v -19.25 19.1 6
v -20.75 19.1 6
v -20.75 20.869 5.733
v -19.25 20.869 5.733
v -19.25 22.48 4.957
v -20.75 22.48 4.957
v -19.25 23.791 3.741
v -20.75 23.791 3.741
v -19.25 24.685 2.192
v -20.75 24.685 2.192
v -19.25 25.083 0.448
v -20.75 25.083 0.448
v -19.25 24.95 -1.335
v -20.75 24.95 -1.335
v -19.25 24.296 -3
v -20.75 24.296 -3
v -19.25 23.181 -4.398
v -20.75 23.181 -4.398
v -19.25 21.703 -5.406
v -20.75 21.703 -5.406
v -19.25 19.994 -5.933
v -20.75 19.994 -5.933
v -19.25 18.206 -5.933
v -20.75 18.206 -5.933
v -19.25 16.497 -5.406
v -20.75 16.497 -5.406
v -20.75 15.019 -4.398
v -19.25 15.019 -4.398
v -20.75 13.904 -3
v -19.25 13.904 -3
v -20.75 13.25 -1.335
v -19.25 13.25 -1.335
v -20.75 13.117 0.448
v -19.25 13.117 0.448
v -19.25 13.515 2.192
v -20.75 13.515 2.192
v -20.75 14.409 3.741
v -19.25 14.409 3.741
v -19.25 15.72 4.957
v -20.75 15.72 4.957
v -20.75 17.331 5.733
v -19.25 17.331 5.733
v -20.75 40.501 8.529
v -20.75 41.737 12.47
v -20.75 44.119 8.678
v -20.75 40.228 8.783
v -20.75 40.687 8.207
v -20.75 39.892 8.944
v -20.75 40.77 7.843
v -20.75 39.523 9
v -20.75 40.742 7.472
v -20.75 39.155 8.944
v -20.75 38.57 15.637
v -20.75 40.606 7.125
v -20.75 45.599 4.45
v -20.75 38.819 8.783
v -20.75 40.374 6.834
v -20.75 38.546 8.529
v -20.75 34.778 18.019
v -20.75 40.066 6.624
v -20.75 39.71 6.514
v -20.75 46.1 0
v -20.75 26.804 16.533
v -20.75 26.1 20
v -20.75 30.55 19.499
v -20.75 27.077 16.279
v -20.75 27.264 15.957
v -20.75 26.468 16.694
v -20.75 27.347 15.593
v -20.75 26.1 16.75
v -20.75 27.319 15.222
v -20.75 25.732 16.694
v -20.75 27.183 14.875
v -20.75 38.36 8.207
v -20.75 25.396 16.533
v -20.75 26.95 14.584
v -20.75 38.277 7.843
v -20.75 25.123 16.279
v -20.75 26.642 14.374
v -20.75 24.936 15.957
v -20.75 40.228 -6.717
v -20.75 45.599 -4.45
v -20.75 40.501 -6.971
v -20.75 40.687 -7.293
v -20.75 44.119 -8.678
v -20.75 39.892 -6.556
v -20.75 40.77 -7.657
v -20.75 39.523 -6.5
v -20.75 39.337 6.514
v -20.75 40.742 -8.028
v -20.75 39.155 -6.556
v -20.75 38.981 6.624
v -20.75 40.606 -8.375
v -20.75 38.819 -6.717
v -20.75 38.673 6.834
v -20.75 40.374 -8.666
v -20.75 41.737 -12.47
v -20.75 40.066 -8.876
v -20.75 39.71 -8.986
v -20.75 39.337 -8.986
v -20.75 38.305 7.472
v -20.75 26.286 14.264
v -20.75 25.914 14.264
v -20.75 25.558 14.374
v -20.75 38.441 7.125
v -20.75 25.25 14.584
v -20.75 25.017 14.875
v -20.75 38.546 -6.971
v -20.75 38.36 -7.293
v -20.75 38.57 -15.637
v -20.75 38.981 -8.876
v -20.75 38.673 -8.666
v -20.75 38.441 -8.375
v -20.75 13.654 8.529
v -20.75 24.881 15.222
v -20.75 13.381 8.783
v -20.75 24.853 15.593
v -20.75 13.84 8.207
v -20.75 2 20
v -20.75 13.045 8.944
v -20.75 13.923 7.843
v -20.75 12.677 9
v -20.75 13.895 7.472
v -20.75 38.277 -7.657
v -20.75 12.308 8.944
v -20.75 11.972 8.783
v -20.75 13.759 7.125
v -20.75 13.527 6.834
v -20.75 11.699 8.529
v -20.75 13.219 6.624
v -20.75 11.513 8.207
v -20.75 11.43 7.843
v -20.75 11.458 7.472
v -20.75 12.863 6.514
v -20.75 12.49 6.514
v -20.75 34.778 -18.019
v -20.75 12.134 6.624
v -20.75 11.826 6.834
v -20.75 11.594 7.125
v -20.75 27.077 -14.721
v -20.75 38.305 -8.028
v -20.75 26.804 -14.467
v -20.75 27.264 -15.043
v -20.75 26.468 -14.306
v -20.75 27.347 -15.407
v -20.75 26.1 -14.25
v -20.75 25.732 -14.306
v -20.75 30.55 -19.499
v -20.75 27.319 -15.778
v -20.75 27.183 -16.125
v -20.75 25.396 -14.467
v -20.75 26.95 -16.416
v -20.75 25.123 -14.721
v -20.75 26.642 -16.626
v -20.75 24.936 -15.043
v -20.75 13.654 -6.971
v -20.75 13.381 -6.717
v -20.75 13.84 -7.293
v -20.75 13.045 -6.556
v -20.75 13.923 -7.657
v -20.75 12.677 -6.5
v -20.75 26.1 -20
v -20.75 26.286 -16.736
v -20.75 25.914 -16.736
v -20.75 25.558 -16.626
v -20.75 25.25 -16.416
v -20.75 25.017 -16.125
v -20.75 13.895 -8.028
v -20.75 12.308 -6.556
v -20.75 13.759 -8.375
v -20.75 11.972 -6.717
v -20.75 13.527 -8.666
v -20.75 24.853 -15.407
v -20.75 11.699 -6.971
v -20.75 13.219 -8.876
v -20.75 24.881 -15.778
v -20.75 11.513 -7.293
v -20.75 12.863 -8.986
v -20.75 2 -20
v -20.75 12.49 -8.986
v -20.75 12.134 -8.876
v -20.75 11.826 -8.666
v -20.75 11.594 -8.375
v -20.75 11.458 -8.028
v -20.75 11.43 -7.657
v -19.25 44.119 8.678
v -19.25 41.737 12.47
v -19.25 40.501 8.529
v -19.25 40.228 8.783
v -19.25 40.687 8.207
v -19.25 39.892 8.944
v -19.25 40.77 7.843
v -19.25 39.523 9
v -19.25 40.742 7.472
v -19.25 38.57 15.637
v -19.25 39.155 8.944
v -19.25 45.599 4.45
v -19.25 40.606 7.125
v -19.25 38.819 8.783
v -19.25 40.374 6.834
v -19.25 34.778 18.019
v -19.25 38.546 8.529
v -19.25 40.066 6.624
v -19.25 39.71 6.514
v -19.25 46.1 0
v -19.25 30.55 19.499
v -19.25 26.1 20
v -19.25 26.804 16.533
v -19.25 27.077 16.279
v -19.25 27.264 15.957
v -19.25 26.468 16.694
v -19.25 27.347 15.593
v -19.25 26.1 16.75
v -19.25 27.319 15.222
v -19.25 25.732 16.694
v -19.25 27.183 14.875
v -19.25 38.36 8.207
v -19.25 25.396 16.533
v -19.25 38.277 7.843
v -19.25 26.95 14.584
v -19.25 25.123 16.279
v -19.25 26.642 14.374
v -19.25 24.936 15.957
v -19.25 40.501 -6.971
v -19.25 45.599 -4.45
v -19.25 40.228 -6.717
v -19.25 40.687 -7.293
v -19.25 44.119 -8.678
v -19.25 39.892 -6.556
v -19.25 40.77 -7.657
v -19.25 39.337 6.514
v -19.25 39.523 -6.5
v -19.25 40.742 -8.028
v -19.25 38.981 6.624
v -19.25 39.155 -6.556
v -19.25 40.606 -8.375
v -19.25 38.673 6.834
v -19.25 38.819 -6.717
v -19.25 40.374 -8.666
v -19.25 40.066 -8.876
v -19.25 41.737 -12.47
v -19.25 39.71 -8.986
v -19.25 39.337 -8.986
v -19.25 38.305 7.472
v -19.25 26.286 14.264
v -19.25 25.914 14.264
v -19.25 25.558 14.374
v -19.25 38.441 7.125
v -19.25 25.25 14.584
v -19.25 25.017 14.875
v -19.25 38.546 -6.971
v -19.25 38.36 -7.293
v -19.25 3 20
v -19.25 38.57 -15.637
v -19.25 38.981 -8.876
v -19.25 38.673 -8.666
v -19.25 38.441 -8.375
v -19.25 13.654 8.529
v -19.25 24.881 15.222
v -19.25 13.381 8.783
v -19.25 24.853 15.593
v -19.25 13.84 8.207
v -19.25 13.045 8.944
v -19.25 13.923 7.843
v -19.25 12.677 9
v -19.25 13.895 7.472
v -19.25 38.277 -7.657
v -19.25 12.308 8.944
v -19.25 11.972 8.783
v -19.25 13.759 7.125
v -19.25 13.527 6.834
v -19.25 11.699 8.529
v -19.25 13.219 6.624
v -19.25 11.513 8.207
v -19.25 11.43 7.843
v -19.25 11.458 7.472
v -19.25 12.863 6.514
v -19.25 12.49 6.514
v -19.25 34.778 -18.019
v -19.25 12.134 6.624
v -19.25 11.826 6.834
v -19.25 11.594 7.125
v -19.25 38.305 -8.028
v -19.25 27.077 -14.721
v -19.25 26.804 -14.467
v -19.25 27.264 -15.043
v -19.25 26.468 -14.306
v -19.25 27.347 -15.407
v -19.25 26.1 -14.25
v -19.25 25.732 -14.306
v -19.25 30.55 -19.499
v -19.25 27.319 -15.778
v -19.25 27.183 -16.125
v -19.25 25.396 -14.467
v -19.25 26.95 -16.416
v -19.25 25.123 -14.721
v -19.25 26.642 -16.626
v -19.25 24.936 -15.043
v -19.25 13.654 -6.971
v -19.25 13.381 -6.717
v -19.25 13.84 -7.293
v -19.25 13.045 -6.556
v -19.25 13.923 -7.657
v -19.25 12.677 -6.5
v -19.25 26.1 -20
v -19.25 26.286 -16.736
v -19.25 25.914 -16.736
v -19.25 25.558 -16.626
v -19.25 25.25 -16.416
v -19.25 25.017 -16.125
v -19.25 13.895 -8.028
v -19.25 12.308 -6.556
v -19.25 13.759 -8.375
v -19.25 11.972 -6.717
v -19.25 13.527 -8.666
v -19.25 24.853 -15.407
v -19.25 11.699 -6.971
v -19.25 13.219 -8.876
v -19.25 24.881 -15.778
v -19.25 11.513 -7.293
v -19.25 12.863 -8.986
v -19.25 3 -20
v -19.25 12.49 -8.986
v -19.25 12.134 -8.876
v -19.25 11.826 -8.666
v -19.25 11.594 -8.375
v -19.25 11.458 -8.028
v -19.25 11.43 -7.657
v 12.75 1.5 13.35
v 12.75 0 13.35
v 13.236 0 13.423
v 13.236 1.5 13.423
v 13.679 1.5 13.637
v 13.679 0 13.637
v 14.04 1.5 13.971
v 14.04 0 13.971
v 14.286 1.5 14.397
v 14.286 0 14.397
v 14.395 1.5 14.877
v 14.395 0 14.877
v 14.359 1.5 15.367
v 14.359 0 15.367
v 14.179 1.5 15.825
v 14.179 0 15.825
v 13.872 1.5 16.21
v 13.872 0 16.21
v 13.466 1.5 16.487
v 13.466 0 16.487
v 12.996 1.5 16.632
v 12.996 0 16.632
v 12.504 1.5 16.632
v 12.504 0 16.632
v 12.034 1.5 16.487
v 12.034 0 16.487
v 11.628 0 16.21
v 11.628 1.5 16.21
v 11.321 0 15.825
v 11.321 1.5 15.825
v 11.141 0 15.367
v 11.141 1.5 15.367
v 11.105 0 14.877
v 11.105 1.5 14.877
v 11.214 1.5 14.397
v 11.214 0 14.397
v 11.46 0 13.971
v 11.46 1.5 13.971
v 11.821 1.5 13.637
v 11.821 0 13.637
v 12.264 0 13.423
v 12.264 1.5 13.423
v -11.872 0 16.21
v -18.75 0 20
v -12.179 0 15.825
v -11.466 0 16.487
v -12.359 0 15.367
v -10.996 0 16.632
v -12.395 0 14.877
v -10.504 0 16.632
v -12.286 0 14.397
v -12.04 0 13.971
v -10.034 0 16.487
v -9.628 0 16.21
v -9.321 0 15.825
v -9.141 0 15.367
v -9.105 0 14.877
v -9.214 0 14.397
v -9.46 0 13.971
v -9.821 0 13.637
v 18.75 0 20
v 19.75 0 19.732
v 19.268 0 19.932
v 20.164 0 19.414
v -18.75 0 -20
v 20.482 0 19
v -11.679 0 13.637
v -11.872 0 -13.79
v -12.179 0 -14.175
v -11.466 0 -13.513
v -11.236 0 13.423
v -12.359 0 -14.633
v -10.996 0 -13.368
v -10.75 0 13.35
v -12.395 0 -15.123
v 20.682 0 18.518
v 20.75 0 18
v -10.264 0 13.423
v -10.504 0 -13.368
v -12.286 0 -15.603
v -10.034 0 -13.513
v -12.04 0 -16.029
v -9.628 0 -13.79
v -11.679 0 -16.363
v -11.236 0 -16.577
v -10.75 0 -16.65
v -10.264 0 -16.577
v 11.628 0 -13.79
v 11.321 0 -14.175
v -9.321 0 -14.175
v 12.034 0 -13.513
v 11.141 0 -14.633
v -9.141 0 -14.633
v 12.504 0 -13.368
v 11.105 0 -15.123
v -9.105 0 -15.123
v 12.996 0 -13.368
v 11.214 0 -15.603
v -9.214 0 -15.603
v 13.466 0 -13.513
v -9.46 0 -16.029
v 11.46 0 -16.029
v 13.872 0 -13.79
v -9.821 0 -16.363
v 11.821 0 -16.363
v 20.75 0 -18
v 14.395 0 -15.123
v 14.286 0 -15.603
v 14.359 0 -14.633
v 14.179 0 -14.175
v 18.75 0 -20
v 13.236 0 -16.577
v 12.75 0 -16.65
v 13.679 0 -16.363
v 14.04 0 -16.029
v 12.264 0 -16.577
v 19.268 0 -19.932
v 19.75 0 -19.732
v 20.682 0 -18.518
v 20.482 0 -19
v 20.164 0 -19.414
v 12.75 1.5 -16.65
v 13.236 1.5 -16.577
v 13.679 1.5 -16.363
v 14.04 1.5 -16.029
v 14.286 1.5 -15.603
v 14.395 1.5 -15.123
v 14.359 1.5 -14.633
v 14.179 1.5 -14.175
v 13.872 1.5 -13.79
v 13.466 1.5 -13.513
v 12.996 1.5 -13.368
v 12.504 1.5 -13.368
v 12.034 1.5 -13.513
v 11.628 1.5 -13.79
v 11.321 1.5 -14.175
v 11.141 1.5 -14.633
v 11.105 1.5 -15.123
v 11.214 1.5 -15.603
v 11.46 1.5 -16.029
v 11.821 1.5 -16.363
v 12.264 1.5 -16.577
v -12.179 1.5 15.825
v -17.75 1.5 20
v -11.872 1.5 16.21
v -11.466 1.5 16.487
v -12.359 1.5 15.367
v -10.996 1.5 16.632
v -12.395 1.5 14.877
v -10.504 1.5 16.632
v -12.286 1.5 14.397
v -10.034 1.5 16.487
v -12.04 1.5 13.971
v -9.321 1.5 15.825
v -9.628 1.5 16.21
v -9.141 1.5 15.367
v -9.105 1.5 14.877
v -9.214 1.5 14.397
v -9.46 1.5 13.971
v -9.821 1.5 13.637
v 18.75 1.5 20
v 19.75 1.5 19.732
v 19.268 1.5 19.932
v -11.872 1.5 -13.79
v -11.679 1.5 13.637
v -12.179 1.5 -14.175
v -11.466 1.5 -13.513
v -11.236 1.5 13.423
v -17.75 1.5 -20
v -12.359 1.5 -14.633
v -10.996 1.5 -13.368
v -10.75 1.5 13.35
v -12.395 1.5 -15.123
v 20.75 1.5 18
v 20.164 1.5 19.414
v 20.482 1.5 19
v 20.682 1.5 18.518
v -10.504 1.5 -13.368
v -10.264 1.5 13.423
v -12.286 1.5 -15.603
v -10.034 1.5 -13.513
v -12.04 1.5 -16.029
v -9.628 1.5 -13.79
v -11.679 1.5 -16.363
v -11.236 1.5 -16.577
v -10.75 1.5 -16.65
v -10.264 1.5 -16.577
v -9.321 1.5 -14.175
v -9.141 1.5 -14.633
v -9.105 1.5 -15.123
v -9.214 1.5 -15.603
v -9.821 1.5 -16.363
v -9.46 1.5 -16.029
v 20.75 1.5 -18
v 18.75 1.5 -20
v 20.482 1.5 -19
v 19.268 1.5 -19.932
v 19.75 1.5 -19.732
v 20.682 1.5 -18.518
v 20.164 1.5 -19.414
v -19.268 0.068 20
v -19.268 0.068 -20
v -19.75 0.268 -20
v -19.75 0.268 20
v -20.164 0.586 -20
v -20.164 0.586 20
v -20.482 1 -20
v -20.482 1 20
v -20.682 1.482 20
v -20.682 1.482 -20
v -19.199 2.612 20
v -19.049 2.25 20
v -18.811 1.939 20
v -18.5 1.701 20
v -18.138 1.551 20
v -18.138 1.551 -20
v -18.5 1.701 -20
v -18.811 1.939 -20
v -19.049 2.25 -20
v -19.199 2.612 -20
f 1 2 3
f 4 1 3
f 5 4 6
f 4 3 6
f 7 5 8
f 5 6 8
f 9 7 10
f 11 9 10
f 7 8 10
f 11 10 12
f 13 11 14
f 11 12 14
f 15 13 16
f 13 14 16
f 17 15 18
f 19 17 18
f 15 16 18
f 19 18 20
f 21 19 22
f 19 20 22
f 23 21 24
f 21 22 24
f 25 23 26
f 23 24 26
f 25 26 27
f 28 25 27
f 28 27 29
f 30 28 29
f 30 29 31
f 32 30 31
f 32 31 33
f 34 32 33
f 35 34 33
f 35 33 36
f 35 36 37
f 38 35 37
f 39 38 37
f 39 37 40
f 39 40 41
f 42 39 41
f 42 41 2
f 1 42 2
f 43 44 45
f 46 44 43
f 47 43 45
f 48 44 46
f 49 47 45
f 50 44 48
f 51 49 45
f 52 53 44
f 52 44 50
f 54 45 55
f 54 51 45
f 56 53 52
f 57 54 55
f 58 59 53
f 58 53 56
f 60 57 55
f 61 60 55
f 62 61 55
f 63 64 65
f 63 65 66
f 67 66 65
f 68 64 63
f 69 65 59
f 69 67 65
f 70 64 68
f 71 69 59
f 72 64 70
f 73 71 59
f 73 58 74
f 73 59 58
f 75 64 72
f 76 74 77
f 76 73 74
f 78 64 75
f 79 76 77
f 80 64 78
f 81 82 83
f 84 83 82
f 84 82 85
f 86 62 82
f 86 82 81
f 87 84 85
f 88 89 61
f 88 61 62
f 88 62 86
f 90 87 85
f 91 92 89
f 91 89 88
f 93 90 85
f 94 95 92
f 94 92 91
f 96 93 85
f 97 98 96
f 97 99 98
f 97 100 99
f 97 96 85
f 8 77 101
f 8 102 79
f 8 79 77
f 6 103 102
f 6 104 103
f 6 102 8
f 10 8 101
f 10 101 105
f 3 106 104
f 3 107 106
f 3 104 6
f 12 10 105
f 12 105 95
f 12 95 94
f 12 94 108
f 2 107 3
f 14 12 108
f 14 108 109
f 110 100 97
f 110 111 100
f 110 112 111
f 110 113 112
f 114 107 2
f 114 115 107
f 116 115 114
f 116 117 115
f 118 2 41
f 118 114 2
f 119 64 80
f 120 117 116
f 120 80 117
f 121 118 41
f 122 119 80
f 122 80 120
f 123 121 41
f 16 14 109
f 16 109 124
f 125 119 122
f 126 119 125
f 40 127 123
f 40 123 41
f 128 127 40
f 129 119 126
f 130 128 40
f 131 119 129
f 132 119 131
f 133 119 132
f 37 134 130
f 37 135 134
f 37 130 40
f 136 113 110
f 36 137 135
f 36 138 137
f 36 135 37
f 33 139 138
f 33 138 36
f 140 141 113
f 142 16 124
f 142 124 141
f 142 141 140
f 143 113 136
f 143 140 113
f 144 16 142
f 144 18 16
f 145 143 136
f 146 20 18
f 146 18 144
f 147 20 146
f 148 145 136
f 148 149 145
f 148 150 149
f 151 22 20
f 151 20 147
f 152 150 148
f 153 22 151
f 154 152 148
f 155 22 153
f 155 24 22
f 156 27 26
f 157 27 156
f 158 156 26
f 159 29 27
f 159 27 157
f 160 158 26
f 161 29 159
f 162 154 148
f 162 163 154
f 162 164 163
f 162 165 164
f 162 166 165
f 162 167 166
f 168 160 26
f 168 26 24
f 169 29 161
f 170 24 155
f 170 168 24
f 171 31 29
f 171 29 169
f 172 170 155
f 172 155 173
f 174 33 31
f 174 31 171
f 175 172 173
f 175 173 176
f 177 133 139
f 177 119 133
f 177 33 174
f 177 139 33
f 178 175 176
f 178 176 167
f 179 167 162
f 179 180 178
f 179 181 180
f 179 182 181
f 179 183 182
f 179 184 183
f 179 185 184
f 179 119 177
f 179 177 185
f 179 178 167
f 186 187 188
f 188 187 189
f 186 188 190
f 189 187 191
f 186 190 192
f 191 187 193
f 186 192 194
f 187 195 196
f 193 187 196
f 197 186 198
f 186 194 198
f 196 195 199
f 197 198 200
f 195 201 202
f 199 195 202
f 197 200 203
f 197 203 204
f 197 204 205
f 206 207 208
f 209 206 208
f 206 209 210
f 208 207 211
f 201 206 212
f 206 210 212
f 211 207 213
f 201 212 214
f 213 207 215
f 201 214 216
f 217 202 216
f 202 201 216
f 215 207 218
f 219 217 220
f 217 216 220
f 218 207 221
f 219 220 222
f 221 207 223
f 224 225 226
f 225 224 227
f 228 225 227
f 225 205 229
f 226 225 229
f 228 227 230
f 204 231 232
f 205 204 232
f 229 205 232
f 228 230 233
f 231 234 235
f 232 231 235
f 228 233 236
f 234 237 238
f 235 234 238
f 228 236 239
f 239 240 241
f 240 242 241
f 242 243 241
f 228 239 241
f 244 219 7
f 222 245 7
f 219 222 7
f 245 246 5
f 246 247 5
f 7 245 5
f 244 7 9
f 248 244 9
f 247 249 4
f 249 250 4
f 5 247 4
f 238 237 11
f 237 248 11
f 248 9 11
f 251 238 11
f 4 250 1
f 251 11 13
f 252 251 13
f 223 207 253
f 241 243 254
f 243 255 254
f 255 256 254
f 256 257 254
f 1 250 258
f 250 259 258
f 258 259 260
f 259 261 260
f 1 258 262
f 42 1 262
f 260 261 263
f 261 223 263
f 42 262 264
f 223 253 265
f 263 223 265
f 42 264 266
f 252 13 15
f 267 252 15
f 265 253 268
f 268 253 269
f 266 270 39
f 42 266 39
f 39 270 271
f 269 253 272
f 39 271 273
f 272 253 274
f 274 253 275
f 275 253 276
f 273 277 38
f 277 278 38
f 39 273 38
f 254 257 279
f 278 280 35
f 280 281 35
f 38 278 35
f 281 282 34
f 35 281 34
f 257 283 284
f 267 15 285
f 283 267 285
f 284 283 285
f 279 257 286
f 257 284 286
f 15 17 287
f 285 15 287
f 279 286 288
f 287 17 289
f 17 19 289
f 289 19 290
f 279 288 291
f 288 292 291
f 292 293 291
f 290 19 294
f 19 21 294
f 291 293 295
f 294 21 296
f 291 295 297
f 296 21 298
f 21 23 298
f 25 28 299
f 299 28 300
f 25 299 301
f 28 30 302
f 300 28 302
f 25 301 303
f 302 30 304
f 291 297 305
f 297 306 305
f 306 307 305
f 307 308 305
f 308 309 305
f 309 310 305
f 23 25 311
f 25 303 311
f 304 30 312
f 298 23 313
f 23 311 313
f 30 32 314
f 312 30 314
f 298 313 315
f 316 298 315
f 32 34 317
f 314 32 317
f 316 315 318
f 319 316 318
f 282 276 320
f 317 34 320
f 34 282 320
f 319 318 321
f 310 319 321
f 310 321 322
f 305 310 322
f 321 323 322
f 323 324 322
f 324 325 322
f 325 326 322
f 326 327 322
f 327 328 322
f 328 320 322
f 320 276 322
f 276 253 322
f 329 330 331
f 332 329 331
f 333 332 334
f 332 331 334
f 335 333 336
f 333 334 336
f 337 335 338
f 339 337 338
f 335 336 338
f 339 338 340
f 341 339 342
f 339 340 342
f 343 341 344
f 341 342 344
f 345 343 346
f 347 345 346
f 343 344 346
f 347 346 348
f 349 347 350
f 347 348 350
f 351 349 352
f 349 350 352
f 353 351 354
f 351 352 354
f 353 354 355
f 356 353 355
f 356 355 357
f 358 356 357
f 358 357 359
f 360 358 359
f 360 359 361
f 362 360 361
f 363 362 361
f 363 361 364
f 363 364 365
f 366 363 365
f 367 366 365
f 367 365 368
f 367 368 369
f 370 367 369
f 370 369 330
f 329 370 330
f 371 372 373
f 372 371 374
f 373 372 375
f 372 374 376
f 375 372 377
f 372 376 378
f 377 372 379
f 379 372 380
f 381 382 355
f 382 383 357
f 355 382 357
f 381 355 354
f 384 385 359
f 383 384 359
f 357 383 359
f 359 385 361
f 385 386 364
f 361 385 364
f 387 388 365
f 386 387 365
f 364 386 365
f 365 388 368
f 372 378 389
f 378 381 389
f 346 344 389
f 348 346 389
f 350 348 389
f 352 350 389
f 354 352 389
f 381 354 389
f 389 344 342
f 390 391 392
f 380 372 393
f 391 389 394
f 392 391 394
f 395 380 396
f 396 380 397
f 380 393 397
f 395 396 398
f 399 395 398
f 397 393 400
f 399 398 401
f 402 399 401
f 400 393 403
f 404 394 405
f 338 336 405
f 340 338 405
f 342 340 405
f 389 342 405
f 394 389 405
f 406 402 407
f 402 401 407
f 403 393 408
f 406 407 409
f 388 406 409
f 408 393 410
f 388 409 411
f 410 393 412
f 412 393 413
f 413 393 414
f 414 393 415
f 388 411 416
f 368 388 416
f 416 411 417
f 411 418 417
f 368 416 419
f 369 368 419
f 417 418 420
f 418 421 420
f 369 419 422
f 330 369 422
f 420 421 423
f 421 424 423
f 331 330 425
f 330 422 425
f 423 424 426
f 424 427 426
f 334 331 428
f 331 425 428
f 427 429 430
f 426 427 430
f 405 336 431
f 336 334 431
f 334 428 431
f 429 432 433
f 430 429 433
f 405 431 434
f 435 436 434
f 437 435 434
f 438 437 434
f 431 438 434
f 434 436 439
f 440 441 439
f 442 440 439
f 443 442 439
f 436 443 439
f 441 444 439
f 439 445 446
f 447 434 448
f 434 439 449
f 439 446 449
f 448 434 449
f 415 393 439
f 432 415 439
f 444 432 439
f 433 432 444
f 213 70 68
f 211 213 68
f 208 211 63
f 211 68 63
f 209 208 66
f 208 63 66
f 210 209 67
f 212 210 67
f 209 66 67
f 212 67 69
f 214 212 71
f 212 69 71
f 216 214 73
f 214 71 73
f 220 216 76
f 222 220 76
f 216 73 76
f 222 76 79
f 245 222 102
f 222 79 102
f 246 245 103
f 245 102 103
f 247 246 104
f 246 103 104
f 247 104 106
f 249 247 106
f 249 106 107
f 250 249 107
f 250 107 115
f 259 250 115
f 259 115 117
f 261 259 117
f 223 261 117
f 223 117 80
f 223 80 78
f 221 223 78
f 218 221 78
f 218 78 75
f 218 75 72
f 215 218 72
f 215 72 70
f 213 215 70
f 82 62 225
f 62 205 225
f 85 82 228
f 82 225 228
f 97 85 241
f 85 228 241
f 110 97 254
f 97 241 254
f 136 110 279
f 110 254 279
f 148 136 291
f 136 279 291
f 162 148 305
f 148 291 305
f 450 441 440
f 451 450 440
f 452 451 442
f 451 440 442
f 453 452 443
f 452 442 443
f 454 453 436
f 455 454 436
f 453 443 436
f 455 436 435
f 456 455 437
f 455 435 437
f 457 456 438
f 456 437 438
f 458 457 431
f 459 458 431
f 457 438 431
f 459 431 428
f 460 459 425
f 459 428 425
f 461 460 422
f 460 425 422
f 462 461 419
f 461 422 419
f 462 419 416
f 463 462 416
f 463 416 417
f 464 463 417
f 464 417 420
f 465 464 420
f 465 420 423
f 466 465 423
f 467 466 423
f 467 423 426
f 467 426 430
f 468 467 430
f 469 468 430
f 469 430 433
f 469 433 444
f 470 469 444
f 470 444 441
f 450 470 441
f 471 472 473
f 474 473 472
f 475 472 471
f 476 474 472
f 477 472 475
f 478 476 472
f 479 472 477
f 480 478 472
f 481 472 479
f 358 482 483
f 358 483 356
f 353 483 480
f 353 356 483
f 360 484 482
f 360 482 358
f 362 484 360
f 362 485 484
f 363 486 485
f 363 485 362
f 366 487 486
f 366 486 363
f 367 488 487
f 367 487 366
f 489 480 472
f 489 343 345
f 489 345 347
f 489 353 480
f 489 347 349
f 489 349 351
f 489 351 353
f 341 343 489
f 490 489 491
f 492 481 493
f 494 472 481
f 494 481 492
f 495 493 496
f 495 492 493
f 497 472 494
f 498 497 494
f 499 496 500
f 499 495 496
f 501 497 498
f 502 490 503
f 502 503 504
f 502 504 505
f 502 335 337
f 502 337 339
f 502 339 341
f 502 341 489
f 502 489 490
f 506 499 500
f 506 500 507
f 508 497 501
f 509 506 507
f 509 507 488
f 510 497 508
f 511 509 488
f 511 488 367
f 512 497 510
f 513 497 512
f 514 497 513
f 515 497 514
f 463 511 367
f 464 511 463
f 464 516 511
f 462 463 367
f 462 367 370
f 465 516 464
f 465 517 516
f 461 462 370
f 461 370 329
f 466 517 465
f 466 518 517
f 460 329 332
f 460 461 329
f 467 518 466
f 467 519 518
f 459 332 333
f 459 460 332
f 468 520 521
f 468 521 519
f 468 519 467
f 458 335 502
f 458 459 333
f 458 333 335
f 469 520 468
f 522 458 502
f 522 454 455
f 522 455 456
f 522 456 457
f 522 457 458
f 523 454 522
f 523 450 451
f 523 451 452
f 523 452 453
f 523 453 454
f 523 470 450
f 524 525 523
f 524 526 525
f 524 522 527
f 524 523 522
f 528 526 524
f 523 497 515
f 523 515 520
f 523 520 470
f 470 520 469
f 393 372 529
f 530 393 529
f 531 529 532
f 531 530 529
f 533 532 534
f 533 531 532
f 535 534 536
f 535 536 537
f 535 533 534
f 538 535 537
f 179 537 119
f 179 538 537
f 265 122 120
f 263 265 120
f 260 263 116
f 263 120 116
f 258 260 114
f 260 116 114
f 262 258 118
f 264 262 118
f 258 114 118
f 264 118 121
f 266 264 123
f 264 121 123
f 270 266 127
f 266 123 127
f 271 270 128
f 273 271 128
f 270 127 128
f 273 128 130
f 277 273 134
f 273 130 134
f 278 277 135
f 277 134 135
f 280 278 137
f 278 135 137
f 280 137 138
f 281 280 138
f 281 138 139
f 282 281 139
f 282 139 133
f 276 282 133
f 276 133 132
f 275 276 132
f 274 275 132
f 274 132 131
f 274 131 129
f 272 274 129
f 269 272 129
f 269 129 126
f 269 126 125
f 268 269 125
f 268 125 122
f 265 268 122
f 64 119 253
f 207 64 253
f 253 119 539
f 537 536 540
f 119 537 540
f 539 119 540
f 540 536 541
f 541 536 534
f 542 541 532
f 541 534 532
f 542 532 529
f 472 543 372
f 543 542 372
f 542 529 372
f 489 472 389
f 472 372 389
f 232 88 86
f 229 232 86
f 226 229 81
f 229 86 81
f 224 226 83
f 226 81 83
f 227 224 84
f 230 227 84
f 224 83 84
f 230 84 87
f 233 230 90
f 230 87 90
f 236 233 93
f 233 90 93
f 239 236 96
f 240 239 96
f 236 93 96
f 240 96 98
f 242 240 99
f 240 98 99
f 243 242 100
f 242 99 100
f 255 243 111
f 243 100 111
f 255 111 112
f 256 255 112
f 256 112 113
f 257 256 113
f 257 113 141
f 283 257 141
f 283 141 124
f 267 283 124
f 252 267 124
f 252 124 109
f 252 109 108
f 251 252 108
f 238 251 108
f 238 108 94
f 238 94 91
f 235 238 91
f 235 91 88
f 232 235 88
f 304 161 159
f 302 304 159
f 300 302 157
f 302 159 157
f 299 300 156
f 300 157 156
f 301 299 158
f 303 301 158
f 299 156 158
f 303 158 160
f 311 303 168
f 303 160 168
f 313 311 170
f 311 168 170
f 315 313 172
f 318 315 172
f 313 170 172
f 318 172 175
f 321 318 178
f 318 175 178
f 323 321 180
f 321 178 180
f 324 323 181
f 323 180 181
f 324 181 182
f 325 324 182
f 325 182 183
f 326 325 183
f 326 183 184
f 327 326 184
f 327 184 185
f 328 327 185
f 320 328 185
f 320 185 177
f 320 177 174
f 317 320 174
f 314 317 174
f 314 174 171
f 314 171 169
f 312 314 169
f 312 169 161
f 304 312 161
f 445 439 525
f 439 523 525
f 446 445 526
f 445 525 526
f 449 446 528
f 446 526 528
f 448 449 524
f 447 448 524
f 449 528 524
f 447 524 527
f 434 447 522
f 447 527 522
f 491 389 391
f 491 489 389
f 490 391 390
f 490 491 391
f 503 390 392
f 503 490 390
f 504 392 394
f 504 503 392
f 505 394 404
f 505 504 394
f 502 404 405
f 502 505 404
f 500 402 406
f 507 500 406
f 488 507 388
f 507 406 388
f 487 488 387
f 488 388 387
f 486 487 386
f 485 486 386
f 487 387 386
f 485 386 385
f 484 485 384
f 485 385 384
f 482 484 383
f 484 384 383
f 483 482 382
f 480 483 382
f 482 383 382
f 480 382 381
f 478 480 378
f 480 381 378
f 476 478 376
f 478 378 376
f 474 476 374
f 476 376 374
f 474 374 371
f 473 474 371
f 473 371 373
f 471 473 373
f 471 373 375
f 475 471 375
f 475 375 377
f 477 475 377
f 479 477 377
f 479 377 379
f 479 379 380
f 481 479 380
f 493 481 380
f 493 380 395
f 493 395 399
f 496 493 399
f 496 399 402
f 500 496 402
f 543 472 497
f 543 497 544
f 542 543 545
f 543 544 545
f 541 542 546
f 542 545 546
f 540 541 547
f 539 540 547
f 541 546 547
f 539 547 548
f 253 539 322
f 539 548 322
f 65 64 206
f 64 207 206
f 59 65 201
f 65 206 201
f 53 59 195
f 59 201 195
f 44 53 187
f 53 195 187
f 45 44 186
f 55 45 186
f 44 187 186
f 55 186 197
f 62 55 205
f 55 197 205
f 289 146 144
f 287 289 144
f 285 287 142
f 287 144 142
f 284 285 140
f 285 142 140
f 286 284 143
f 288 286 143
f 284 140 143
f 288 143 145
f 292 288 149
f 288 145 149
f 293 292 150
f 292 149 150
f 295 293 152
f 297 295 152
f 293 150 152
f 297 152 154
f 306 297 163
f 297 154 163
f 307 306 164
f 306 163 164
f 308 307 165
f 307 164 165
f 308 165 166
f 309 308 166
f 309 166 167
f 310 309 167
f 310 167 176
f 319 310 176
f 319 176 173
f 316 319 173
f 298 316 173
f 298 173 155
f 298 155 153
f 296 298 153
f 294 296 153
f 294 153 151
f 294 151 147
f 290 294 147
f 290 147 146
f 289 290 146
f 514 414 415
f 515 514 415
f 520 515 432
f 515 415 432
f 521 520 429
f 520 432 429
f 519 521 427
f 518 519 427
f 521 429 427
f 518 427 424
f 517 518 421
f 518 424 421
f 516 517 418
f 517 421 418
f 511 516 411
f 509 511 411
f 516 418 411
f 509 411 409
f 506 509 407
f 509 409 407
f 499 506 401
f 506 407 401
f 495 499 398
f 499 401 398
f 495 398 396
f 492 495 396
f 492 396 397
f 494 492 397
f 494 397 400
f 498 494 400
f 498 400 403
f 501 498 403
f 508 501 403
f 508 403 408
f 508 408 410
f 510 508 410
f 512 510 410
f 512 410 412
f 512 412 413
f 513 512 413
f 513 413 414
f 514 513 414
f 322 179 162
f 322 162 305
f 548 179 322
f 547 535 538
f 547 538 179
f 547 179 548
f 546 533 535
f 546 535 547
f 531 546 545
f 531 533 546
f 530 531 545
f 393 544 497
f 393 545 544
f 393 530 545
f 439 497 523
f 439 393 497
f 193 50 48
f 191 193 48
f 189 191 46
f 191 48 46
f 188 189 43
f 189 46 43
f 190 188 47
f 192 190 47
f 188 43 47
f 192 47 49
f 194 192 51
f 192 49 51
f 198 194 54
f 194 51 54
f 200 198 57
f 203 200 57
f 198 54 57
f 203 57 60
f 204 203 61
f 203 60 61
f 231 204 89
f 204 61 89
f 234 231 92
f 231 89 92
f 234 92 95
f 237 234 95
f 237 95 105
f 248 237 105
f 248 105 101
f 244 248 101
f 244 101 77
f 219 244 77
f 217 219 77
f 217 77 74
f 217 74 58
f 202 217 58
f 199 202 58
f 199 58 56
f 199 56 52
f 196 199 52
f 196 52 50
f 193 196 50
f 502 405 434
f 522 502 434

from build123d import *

# Parameters (mm, degrees)
SKETCH_1_W          = 41.5
SKETCH_1_H          = 40
EXTRUDE_1_DEPTH     = 1.5
SKETCH_2_W          = 1.5
SKETCH_2_H          = 40
EXTRUDE_2_DEPTH     = 44.6
FILLET_2_R          = 20
FILLET_3_R          = 20
SKETCH_3_R          = 1.25
SKETCH_3_R_2        = 6
CUT_EXTRUDE_1_DEPTH = 44.6
SKETCH_4_R          = 1.65
CUT_EXTRUDE_2_DEPTH = 44.6
FILLET_5_R          = 2
FILLET_6_R          = 2
FILLET_7_R          = 1.5


with BuildPart() as part:
    # Эскиз1 → Бобышка-Вытянуть1 (new body)
    with BuildSketch(Plane(origin=(0, 0, 0), x_dir=(1, 0, 0), z_dir=(0, 1, 0))):
        Rectangle(SKETCH_1_W, SKETCH_1_H)
    extrude(amount=EXTRUDE_1_DEPTH)

    # Эскиз2 → Бобышка-Вытянуть2 (add)
    with BuildSketch(Plane(origin=(0, 1.5, 0), x_dir=(1, 0, 0), z_dir=(0, 1, 0))):
        with Locations((-20, 0)):
            Rectangle(SKETCH_2_W, SKETCH_2_H)
    extrude(amount=EXTRUDE_2_DEPTH)

    # Скругление2
    fillet_2_edges = [part.edges().sort_by_distance(p)[0] for p in [
        (-20, 46.1, 20),
    ]]
    fillet(fillet_2_edges, radius=FILLET_2_R)

    # Скругление3
    fillet_3_edges = [part.edges().sort_by_distance(p)[0] for p in [
        (-20, 46.1, -20),
    ]]
    fillet(fillet_3_edges, radius=FILLET_3_R - 0.0001)  # a hair under: the kernel refuses the full size

    # Эскиз3 → Вырез-Вытянуть1 (cut)
    with BuildSketch(Plane.ZY.offset(20.75)):
        with Locations((-15.5, 26.1)):
            Circle(SKETCH_3_R)
        with Locations((-7.75, 39.523393759)):
            Circle(SKETCH_3_R)
        with Locations((7.75, 39.523393759)):
            Circle(SKETCH_3_R)
        with Locations((15.5, 26.1)):
            Circle(SKETCH_3_R)
        with Locations((7.75, 12.676606241)):
            Circle(SKETCH_3_R)
        with Locations((-7.75, 12.676606241)):
            Circle(SKETCH_3_R)
        with Locations((0, 19.1)):
            Circle(SKETCH_3_R_2)
    extrude(amount=-CUT_EXTRUDE_1_DEPTH, mode=Mode.SUBTRACT)

    # Эскиз4 → Вырез-Вытянуть2 (cut)
    with BuildSketch(Plane.XZ):
        with Locations(Location((12.75, 15, 0), (0, 0, 270))):
            Circle(SKETCH_4_R)
        with Locations(Location((-10.75, 15, 0), (0, 0, 270))):
            Circle(SKETCH_4_R)
        with Locations(Location((-10.75, -15, 0), (0, 0, 270))):
            Circle(SKETCH_4_R)
        with Locations(Location((12.75, -15, 0), (0, 0, 270))):
            Circle(SKETCH_4_R)
    extrude(amount=-CUT_EXTRUDE_2_DEPTH, mode=Mode.SUBTRACT)

    # Скругление5
    fillet_5_edges = [part.edges().sort_by_distance(p)[0] for p in [
        (20.75, 0.75, -20),
        (20.75, 0.75, 20),
    ]]
    fillet(fillet_5_edges, radius=FILLET_5_R)

    # Скругление6
    fillet_6_edges = [part.edges().sort_by_distance(p)[0] for p in [
        (-20.75, 0, 0),
    ]]
    fillet(fillet_6_edges, radius=FILLET_6_R)

    # Скругление7
    fillet_7_edges = [part.edges().sort_by_distance(p)[0] for p in [
        (-19.25, 1.5, 0),
    ]]
    fillet(fillet_7_edges, radius=FILLET_7_R)


solid = part.part
